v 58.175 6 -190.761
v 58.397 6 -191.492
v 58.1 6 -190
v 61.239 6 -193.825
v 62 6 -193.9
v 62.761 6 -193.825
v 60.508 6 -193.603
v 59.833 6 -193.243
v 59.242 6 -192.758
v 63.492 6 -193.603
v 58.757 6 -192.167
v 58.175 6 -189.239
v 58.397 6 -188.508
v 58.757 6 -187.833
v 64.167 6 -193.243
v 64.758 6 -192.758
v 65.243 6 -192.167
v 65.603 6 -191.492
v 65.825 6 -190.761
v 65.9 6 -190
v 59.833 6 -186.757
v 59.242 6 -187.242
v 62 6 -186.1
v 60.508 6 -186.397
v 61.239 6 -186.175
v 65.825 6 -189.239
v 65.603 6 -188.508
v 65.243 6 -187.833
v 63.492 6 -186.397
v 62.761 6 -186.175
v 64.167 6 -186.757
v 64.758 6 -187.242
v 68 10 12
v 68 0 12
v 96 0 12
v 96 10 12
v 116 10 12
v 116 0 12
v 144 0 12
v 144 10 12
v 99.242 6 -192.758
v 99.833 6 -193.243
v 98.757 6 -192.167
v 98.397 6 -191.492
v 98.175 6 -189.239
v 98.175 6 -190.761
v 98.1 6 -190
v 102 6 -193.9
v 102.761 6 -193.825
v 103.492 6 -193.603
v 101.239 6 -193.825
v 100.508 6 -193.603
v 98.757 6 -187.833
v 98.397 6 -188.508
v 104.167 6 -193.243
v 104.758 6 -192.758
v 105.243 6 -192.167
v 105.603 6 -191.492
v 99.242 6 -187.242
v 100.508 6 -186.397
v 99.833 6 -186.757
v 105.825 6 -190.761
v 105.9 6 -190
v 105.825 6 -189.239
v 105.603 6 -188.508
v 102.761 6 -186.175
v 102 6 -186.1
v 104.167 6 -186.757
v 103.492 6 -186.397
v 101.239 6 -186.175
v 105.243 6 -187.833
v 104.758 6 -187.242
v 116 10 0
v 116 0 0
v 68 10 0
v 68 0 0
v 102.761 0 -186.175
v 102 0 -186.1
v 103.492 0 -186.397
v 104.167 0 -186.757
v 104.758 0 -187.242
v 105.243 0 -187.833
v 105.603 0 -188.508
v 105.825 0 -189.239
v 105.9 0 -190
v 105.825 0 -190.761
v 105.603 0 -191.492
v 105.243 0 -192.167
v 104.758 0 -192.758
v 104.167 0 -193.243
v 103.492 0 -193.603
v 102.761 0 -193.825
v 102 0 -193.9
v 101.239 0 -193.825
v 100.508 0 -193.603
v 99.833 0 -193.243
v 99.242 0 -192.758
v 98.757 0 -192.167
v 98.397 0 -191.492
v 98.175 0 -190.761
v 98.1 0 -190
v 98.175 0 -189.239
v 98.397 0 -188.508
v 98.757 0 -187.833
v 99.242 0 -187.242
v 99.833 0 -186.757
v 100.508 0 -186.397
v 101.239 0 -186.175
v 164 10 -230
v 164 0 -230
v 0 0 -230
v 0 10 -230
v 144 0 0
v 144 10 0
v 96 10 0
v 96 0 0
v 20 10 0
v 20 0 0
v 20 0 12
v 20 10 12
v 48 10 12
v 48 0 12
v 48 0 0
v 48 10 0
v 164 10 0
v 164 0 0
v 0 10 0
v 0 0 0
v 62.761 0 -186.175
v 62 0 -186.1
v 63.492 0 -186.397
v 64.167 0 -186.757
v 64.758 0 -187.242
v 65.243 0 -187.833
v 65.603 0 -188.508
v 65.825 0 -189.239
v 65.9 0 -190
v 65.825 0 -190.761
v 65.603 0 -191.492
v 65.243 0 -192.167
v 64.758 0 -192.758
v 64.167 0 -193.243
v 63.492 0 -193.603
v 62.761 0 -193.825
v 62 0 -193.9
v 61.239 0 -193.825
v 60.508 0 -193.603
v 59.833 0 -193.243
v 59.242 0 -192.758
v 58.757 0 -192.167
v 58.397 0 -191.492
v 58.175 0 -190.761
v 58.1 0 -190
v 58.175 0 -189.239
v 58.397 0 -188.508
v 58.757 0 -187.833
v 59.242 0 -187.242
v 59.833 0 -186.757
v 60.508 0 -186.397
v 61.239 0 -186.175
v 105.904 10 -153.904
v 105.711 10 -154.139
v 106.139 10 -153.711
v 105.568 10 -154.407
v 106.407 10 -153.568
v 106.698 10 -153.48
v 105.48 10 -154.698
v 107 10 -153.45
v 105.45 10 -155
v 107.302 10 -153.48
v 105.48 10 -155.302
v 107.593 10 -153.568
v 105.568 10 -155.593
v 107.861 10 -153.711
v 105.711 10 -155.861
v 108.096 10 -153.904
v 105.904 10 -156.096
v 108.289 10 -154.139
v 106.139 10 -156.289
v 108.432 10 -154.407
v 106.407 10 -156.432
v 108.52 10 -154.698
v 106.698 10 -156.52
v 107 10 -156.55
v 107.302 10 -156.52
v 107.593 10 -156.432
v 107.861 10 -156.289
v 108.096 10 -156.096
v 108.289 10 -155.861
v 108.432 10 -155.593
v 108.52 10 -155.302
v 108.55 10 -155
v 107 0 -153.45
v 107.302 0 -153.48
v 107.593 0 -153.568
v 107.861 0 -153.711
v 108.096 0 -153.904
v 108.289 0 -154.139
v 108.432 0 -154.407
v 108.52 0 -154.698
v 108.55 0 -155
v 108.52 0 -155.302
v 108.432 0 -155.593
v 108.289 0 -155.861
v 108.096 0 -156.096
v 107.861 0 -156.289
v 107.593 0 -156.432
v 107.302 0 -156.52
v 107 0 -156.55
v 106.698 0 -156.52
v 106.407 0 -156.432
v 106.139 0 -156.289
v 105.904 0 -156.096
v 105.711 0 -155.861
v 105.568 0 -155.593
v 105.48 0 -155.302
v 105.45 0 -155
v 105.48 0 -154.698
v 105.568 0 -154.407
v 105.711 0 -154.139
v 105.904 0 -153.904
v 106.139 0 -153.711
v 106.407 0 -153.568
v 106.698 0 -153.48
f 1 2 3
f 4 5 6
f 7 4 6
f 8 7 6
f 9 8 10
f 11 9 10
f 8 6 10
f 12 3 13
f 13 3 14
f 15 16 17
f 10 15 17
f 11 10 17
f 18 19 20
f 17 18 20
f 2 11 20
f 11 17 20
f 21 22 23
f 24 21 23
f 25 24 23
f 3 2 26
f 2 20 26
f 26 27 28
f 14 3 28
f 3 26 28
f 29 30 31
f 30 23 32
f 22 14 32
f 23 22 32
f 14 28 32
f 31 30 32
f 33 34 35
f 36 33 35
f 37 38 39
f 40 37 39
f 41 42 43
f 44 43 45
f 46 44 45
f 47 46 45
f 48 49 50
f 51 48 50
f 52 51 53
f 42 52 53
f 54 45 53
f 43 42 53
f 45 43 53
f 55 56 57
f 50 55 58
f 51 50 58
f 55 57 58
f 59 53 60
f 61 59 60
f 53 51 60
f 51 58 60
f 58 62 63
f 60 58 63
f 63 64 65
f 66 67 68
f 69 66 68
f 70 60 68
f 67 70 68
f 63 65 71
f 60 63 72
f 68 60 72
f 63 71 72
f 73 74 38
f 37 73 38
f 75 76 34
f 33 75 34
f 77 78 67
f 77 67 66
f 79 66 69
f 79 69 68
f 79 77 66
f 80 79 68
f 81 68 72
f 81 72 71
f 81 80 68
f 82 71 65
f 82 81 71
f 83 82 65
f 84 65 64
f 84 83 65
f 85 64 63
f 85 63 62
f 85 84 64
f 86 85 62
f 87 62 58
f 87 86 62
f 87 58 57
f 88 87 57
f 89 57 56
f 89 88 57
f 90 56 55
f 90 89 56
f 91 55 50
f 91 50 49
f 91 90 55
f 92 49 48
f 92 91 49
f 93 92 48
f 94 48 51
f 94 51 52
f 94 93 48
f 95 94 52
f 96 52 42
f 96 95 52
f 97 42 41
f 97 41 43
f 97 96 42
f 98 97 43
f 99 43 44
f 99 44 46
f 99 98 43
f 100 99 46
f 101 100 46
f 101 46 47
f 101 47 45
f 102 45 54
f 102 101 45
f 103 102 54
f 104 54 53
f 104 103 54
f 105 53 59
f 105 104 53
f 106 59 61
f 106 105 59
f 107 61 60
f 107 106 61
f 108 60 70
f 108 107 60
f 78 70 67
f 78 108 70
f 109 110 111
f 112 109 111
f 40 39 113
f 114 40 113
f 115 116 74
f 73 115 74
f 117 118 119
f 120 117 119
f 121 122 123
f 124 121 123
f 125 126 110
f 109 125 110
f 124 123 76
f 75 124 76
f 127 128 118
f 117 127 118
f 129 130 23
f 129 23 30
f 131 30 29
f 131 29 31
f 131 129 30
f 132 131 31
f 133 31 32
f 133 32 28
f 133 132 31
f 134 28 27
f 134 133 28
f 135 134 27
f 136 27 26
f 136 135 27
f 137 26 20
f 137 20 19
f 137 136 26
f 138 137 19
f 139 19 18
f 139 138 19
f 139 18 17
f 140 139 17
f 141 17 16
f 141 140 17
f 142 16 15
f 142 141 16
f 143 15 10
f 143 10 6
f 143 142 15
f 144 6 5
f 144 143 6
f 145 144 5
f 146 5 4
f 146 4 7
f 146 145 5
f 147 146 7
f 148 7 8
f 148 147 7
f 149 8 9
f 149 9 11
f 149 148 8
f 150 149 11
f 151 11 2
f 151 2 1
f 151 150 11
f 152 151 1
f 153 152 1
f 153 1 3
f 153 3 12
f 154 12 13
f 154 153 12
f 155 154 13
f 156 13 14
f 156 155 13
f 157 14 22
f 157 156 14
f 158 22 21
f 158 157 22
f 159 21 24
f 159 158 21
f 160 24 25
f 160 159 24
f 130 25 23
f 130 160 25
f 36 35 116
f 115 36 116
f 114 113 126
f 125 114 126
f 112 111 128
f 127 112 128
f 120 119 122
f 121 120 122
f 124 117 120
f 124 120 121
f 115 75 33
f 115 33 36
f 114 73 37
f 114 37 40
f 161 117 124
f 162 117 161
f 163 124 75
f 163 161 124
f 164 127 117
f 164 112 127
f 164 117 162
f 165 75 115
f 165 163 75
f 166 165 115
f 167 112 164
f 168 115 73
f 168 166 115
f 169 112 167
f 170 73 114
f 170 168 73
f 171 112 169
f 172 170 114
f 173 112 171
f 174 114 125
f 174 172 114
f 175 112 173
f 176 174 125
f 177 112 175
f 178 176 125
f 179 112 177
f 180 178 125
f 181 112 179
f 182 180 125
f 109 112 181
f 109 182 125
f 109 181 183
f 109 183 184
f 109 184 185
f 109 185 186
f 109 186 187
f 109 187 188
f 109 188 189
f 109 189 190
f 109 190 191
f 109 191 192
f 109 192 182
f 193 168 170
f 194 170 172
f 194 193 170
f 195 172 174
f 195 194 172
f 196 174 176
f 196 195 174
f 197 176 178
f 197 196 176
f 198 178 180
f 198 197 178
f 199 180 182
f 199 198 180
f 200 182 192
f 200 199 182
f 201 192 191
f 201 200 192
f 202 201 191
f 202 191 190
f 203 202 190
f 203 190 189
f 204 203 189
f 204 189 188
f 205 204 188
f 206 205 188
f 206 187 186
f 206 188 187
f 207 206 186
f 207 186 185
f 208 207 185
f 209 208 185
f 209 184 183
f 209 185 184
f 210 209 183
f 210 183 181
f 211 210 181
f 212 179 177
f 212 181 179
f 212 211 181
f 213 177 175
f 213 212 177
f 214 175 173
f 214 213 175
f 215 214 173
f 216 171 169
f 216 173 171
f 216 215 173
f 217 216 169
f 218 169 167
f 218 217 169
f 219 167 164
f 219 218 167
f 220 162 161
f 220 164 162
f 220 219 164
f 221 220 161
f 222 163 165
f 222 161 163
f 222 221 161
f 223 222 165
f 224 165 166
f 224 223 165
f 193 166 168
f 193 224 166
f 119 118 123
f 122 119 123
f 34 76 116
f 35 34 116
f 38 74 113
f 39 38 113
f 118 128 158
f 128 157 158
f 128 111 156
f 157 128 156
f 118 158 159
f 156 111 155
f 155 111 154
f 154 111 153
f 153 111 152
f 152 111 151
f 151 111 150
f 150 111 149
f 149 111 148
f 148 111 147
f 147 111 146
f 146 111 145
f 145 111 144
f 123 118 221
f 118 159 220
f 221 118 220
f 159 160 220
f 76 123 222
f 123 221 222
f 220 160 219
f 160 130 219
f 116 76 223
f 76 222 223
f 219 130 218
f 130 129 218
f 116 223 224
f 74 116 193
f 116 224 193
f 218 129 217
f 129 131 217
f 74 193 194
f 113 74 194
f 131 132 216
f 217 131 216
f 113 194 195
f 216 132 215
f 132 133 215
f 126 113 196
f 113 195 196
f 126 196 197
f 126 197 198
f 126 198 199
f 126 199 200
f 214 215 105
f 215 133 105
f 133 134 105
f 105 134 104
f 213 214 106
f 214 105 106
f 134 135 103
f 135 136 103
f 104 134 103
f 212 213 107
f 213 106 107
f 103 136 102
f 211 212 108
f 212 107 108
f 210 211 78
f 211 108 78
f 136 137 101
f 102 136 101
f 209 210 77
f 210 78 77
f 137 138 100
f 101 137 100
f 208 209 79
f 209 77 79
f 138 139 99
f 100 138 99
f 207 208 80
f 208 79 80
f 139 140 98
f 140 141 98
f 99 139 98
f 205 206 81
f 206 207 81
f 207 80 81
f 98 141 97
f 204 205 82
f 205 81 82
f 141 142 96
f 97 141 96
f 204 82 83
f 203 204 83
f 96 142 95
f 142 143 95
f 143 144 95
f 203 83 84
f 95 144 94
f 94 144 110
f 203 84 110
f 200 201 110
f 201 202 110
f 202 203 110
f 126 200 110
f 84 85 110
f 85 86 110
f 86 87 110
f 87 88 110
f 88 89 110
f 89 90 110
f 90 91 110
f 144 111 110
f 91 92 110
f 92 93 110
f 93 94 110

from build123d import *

# Parameters (mm, degrees)
SALIENTE_EXTRUIR1_DEPTH = 10
CROQUIS1_10_R           = 3.9
CORTAR_EXTRUIR1_DEPTH   = 6
CROQUIS1_11_R           = 1.55
CORTAR_EXTRUIR3_DEPTH   = 283.658804922


with BuildPart() as part:
    # Croquis1 → Saliente-Extruir1 (new body)
    with BuildSketch(Plane(origin=(0, 0, 0), x_dir=(1, 0, 0), z_dir=(0, 1, 0))):
        Polygon((0, 0), (20, 0), (20, -12), (48, -12), (48, 0), (68, 0), (68, -12), (96, -12), (96, 0), (116, 0), (116, -12), (144, -12), (144, 0), (164, 0), (164, 230), (0, 230), align=None)
    extrude(amount=SALIENTE_EXTRUIR1_DEPTH)

    # Croquis1<10> → Cortar-Extruir1 (cut)
    with BuildSketch(Plane(origin=(0, 0, 0), x_dir=(1, 0, 0), z_dir=(0, 1, 0))):
        with Locations((62, 190)):
            Circle(CROQUIS1_10_R)
        with Locations((102, 190)):
            Circle(CROQUIS1_10_R)
    extrude(amount=CORTAR_EXTRUIR1_DEPTH, mode=Mode.SUBTRACT)

    # Croquis1<11> → Cortar-Extruir3 (cut, through all)
    with BuildSketch(Plane(origin=(0, 0, 0), x_dir=(1, 0, 0), z_dir=(0, 1, 0))):
        with Locations((107, 155)):
            Circle(CROQUIS1_11_R)
    extrude(amount=CORTAR_EXTRUIR3_DEPTH, mode=Mode.SUBTRACT)


solid = part.part
